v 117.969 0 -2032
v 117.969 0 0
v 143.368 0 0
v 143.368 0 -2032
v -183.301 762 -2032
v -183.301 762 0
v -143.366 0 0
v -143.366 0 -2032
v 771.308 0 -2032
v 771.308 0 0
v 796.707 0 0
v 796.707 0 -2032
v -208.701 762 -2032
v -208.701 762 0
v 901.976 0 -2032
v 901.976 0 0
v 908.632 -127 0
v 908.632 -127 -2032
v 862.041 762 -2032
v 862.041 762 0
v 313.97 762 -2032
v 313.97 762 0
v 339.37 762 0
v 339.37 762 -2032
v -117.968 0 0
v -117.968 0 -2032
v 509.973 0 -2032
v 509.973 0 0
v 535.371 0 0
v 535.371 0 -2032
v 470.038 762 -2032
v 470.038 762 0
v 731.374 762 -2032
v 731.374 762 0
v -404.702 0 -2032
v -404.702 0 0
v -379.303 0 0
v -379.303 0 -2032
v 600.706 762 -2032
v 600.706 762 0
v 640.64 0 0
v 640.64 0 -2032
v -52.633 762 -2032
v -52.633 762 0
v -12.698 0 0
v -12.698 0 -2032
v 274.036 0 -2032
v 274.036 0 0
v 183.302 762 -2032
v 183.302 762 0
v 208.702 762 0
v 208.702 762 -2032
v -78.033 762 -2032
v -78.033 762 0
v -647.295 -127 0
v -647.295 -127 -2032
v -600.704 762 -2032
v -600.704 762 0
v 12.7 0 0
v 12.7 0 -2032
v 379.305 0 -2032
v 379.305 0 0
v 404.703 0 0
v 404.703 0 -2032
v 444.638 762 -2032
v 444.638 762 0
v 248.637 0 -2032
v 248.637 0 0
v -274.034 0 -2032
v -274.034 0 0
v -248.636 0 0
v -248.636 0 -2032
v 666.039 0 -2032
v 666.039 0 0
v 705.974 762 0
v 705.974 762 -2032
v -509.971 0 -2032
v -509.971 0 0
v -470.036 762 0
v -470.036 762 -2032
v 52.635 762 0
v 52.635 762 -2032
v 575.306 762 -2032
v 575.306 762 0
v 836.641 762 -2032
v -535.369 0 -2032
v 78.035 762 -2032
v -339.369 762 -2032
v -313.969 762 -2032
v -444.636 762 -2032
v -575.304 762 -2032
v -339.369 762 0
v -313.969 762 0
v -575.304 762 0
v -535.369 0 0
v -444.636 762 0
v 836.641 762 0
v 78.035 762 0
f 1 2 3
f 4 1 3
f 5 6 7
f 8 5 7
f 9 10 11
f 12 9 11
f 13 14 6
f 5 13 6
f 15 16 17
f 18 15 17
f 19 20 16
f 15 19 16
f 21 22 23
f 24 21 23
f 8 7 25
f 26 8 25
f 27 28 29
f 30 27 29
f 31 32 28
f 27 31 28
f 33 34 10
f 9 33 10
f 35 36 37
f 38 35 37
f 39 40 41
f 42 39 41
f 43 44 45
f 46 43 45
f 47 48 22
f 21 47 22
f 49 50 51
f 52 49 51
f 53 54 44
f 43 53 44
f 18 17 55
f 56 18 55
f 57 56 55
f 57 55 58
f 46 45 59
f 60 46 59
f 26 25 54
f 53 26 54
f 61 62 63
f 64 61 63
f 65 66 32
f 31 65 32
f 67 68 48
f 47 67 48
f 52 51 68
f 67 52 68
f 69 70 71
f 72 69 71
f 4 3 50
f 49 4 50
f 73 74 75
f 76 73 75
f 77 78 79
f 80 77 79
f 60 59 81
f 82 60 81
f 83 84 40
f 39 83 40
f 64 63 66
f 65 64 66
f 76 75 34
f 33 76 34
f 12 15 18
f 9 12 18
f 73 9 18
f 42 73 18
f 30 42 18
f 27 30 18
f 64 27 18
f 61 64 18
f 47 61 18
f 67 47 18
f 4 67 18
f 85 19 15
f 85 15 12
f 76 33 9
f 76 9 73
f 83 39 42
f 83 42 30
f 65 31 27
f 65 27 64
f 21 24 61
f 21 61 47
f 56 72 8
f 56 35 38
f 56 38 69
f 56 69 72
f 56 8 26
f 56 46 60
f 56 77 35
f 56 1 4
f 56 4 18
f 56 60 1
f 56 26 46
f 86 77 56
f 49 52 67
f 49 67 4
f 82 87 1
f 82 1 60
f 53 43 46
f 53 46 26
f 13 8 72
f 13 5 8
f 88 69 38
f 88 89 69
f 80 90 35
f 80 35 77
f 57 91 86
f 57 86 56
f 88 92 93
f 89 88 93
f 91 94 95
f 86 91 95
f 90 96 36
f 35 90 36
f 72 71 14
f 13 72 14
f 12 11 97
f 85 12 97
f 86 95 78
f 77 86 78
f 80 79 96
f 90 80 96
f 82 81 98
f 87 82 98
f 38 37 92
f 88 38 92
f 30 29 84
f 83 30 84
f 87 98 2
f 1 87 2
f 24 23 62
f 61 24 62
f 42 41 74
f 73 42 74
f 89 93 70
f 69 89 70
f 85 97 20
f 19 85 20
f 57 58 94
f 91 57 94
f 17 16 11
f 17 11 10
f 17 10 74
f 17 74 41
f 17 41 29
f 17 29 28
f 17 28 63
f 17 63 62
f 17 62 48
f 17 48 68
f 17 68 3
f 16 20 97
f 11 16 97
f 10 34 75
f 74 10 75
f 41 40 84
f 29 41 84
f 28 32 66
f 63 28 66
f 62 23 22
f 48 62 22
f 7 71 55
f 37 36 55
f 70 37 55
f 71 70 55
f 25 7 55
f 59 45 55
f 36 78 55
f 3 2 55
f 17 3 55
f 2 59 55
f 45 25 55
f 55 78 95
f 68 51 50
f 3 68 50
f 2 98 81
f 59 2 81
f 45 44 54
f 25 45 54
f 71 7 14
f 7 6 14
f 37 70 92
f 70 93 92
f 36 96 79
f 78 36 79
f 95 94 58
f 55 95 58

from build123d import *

# Parameters (mm, degrees)
BOSS_EXTRUDE1_DEPTH  = 2032
LPATTERN1_COUNT      = 6
LPATTERN1_PITCH      = 130.66776
LPATTERN1_COUNT_DIR2 = 7
LPATTERN1_PITCH_DIR2 = 130.66776
CUT_EXTRUDE1_DEPTH   = 2032


with BuildPart() as part:
    # Sketch1 → Boss-Extrude1 (new body)
    with BuildSketch(Plane.XY):
        Polygon((0, 0), (12.7, 0), (52.634727814, 762), (78.034727814, 762), (117.969455627, 0), (130.669455627, 0), (130.669455627, -127), (0, -127), align=None)
    boss_extrude1 = extrude(amount=-BOSS_EXTRUDE1_DEPTH)

    # LPattern1: Boss-Extrude1 6 × 7
    with Locations(*[Vector(-1, 0, 0) * (i * LPATTERN1_PITCH) + Vector(1, 0, 0) * (j * LPATTERN1_PITCH_DIR2) for i in range(LPATTERN1_COUNT) for j in range(LPATTERN1_COUNT_DIR2) if (i, j) != (0, 0)]):
        add(boss_extrude1)

    # Sketch2 → Cut-Extrude1 (cut)
    with BuildSketch(Plane.XY):
        Polygon((-640.6388, 0), (-647.294587969, -127), (-653.3388, -127), (-653.3388, 0), align=None)
        Polygon((901.976015627, 0), (908.631803596, -127), (914.676015627, -127), (914.676015627, 0), align=None)
    extrude(amount=-CUT_EXTRUDE1_DEPTH, mode=Mode.SUBTRACT)


solid = part.part
